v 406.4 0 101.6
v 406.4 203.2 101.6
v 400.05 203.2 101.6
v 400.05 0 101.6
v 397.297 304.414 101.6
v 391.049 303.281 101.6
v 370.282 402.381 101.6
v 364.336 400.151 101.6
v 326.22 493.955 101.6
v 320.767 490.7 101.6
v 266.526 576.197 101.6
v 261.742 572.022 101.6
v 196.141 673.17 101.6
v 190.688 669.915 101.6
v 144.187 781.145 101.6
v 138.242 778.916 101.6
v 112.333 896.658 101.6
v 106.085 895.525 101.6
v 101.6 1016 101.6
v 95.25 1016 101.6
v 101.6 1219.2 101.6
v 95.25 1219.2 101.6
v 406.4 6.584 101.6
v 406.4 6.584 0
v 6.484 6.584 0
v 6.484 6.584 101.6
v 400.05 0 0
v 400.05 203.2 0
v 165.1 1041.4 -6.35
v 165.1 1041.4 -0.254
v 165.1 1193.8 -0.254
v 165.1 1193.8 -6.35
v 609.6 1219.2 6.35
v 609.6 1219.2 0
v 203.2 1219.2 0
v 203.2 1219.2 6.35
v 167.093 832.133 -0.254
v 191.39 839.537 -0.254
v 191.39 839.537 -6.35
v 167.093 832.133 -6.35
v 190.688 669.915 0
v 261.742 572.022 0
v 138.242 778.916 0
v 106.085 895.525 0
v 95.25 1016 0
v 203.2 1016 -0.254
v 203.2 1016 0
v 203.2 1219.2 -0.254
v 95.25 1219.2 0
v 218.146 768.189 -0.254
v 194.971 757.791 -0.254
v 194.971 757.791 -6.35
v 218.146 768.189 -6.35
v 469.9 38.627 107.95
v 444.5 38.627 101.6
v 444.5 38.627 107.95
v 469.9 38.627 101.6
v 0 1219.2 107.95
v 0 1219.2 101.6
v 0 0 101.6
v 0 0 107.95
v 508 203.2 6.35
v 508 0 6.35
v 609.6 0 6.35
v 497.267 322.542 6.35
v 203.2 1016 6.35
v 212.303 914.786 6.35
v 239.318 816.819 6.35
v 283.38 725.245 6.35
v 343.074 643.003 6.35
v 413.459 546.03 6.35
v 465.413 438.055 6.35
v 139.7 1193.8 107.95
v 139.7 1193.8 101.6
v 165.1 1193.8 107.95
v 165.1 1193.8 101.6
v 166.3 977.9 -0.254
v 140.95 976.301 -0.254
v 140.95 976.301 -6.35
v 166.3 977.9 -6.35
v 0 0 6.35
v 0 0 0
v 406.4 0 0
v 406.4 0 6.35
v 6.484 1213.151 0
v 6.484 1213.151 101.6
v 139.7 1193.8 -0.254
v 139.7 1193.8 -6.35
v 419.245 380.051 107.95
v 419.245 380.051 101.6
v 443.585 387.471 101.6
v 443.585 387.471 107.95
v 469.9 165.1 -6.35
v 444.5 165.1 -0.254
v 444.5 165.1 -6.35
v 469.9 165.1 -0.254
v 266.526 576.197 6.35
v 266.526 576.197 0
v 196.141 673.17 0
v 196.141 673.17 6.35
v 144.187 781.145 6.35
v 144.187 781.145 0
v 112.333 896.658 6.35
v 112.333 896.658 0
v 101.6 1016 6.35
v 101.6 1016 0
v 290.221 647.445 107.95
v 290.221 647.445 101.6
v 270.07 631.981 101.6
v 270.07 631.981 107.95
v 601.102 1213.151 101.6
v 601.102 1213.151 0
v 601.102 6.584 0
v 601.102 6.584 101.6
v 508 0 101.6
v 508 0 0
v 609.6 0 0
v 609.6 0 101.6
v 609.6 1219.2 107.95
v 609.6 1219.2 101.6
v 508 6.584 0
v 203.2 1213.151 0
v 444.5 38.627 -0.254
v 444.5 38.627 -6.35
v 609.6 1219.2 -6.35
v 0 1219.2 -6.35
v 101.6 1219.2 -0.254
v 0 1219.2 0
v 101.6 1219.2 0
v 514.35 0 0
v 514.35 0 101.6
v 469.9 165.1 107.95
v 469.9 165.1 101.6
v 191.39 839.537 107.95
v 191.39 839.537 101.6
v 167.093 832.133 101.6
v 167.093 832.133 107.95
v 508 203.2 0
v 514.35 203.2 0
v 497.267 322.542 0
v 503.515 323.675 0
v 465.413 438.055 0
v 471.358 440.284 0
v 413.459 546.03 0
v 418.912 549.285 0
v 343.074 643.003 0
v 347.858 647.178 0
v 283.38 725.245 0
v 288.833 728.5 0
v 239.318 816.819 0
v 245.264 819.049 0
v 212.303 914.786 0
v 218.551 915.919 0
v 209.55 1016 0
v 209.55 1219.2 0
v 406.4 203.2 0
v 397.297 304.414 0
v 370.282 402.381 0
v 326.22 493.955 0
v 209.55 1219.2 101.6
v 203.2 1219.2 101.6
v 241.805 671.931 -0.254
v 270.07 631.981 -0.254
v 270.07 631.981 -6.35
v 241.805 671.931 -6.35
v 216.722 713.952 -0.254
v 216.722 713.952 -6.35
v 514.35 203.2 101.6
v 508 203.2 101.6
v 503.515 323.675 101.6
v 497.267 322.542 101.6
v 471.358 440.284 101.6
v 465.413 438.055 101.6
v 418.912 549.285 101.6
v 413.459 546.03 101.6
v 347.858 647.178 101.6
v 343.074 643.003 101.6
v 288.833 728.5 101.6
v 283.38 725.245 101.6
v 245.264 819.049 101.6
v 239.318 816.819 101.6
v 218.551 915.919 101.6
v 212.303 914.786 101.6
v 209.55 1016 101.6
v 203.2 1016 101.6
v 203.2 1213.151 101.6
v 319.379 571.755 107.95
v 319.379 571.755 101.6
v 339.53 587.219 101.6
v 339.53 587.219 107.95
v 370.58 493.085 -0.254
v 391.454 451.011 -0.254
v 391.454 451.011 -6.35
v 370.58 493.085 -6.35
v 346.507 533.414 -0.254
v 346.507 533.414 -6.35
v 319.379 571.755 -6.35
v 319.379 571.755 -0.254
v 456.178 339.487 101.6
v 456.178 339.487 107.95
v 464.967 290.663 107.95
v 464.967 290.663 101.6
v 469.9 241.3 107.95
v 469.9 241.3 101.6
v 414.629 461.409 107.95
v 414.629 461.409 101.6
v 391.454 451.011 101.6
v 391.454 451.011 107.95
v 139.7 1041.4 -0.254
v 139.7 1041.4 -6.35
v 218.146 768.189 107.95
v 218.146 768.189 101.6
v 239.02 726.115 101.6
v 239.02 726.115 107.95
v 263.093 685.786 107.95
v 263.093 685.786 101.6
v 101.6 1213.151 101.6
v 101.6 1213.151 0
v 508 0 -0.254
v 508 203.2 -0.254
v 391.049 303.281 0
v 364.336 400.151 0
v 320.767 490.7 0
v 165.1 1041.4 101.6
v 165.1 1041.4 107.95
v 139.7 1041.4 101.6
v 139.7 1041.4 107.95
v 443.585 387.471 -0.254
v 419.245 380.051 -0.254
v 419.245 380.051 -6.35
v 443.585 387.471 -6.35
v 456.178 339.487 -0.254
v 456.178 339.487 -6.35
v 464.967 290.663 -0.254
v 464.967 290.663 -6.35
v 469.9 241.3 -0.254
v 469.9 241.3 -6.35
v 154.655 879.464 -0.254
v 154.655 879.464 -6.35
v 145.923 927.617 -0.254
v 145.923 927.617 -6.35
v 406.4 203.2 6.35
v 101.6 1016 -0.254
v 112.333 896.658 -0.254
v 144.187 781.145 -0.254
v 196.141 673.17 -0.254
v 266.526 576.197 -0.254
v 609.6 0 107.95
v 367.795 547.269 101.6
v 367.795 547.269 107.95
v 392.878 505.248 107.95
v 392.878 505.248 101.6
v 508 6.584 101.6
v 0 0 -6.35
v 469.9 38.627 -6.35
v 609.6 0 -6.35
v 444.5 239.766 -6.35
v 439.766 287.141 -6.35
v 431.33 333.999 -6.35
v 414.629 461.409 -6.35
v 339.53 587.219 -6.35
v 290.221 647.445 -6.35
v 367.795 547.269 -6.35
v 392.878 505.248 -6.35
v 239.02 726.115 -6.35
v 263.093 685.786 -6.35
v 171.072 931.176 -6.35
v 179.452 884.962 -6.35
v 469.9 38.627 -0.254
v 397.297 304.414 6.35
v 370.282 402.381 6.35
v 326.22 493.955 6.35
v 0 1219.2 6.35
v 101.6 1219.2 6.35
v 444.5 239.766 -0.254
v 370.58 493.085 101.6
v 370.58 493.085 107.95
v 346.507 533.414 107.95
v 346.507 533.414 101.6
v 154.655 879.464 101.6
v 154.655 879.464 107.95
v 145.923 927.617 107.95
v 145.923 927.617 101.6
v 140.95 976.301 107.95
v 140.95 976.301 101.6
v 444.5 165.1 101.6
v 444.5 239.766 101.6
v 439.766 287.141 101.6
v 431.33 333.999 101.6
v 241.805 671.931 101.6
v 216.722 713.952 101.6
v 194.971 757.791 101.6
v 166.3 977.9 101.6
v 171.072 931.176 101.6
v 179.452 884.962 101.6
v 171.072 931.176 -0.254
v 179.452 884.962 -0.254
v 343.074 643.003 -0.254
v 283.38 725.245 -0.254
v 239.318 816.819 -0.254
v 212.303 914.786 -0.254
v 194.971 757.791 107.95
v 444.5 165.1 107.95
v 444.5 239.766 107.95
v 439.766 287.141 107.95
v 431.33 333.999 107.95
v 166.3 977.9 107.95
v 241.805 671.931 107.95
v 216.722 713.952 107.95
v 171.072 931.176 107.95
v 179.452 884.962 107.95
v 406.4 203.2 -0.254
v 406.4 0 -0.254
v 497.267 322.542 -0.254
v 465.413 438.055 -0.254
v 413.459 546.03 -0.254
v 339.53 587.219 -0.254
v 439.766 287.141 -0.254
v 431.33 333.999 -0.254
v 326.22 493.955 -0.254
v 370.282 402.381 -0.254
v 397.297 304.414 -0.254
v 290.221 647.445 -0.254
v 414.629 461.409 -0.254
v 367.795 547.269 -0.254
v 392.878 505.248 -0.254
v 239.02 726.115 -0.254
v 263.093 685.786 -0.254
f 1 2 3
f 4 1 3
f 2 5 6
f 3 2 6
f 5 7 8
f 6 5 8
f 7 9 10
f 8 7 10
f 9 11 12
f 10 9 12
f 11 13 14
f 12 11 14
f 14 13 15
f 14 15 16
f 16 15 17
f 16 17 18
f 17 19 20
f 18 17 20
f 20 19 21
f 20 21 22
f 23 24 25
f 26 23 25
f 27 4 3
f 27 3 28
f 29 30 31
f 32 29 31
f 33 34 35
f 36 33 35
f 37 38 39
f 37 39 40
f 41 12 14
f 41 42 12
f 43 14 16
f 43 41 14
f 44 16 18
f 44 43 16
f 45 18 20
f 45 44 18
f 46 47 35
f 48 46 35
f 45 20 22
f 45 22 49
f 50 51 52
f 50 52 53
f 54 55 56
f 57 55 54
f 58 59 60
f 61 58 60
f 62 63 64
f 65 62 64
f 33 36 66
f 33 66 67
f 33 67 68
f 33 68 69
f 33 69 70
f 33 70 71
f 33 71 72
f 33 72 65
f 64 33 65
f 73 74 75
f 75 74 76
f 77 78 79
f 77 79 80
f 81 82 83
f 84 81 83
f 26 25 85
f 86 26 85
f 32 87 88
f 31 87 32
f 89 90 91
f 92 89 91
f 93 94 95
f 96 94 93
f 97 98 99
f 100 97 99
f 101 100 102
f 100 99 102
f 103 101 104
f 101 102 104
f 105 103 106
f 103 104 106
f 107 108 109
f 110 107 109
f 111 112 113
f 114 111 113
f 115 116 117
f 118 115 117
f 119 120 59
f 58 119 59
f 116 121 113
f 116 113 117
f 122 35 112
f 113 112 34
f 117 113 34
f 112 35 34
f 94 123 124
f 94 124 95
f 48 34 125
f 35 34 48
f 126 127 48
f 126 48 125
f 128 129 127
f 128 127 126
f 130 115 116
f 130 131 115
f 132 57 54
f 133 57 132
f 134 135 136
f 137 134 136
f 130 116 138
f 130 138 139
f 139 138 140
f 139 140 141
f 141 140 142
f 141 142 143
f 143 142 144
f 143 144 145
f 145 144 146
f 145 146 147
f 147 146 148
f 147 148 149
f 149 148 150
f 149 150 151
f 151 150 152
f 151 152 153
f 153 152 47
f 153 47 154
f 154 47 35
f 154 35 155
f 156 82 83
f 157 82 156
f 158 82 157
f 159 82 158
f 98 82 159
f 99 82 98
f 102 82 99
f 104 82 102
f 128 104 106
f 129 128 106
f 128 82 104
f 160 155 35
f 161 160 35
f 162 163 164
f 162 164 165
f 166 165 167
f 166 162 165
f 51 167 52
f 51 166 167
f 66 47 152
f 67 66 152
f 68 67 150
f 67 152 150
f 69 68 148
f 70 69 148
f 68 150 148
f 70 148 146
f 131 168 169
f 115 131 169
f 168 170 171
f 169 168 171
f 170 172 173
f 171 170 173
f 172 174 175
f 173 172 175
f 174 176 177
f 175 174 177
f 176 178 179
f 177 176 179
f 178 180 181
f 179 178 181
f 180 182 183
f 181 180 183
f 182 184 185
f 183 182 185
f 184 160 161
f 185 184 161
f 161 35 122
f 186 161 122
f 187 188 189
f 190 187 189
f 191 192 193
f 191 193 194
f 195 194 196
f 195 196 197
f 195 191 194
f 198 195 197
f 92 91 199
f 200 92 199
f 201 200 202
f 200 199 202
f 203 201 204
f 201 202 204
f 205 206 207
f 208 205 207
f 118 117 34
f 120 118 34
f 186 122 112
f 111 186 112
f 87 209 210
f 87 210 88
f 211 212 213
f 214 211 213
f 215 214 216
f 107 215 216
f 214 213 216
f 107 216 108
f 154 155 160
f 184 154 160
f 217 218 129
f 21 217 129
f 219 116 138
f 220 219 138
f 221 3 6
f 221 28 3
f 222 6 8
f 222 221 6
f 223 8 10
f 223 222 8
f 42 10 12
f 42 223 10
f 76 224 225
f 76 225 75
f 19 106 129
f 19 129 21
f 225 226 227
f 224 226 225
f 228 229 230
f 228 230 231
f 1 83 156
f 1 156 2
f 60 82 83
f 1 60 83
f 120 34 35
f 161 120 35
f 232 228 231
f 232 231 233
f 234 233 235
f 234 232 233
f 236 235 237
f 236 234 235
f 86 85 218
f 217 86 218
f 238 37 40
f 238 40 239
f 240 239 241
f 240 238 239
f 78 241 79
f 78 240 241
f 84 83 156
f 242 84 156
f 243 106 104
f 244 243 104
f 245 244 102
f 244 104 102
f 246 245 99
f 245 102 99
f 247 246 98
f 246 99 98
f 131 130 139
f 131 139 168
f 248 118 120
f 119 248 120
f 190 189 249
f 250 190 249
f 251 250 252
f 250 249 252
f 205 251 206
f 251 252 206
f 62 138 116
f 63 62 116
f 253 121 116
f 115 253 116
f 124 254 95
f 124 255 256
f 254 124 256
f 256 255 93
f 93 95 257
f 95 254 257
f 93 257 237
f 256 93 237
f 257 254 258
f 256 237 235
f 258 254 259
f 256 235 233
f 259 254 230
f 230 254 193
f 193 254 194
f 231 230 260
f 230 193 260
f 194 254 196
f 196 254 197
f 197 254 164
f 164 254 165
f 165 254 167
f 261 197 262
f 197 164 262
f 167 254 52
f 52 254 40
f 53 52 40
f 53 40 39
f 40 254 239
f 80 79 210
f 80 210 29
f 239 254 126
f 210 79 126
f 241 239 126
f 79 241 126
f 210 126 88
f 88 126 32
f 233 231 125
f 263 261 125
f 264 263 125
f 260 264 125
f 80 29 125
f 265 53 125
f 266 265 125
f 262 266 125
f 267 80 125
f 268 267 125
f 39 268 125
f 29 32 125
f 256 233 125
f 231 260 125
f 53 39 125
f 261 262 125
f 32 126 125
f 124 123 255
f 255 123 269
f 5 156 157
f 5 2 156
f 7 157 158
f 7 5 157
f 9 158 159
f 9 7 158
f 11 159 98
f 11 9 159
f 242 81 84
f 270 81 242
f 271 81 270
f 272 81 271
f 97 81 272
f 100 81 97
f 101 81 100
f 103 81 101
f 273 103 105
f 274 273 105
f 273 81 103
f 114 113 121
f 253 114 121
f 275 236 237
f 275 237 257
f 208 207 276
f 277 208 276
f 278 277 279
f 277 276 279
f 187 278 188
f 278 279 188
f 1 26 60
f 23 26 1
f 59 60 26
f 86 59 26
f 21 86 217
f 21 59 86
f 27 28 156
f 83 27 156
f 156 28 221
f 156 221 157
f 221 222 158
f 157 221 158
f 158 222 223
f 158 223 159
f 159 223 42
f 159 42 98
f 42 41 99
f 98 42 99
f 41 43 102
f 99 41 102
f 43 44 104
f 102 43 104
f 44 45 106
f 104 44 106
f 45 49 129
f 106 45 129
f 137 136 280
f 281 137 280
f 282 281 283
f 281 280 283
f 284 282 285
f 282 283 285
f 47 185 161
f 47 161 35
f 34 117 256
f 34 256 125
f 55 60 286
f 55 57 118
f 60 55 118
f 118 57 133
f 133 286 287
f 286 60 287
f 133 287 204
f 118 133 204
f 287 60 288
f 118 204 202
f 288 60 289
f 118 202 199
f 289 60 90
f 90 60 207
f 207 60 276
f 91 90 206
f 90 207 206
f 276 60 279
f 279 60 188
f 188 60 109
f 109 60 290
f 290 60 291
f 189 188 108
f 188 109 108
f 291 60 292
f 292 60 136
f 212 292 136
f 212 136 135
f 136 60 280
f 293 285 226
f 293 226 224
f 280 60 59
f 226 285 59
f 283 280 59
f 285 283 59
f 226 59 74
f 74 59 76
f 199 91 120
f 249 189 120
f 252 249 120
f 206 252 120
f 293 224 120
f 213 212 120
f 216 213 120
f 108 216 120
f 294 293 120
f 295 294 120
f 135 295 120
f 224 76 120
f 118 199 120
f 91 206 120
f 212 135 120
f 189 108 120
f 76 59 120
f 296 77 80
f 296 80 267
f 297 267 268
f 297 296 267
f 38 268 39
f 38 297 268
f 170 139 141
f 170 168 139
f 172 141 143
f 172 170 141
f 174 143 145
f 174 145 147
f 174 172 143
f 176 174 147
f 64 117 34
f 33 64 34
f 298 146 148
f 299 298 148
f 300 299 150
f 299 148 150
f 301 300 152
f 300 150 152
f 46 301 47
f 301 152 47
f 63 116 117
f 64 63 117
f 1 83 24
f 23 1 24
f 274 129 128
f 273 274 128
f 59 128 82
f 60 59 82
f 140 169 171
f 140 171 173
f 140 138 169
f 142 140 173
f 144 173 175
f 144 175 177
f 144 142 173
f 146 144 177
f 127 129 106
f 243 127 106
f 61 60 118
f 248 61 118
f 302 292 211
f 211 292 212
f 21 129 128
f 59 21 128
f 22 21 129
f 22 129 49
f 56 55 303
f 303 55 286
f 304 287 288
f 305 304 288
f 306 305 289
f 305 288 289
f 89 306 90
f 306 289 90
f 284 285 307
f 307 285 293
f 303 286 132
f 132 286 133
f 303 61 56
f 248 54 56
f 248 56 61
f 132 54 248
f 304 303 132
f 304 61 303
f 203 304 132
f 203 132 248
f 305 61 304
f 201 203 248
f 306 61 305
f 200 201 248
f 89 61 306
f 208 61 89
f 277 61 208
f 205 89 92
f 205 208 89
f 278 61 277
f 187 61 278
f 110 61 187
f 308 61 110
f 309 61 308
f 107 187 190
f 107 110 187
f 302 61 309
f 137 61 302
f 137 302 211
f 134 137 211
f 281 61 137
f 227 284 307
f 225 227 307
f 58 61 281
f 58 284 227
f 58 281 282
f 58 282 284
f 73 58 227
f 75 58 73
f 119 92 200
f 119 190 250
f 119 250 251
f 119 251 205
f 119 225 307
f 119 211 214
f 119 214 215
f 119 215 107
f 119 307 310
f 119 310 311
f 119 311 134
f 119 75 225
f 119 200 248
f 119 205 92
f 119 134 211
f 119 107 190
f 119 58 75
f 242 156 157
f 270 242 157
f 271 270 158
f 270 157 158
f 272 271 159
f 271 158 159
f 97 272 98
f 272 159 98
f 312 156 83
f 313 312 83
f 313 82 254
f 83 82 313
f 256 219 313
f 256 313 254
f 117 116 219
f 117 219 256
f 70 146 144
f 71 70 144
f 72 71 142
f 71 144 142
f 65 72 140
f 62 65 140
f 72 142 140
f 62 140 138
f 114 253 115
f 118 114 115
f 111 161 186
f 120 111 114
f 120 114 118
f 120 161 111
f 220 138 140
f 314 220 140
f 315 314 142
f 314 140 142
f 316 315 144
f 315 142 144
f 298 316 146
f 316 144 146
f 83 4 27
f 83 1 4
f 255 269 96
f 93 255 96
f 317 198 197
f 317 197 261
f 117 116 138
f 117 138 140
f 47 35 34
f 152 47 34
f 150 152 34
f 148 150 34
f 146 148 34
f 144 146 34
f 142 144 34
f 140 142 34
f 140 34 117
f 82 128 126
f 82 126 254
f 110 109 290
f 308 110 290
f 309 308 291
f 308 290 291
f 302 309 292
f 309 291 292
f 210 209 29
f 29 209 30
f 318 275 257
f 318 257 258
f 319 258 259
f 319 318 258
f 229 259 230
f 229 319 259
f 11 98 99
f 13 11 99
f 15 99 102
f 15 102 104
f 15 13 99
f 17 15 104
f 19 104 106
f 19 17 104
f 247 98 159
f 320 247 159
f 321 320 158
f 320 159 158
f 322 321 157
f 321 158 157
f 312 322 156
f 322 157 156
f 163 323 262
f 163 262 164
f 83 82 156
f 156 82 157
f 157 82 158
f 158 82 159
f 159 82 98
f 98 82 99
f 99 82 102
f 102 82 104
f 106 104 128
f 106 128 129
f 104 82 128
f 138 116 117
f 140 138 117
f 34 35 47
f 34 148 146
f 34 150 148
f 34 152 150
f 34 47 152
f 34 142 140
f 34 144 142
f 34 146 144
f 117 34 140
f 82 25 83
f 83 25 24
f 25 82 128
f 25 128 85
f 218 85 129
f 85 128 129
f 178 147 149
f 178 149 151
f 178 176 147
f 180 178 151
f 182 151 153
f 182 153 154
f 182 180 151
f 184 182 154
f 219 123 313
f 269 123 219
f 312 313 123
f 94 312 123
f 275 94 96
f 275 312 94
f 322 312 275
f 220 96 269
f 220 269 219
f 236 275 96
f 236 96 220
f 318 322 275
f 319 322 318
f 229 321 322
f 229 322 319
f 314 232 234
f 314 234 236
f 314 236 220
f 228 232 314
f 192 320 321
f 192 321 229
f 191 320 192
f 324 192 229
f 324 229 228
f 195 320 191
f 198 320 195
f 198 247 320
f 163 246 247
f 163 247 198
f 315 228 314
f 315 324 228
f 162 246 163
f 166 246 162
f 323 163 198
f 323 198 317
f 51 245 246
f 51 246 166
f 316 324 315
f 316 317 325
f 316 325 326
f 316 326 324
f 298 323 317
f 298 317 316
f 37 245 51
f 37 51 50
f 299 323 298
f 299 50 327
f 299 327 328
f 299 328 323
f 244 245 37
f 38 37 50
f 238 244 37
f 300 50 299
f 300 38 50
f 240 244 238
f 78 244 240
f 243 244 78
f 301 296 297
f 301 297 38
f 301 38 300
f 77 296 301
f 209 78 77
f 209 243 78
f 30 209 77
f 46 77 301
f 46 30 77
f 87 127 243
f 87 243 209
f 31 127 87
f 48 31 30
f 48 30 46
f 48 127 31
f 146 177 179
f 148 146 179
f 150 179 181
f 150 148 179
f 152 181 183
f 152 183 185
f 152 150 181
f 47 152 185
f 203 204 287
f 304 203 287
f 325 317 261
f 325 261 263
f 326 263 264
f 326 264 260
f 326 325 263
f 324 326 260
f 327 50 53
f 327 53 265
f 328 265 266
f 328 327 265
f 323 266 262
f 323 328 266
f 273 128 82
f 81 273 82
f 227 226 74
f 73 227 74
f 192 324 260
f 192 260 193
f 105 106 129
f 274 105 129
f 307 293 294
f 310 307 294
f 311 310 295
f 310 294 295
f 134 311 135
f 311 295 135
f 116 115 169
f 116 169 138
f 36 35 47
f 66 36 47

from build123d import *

# Parameters (mm, degrees)
F0_W      = 25.4
F0_H      = 126.473148486
F0_H_2    = 152.4
F1_DEPTH  = 6.35
F2_W      = 6.35
F2_H      = 101.6
F2_W_2    = 101.6
F2_R      = 44.45
F5_DEPTH  = 6.35
F6_DEPTH  = 6.35
F7_DEPTH  = 0.254
F9_DEPTH  = 101.6
F11_START = 101.6
F11_DEPTH = 6.35


with BuildPart() as f1:
    # F0 (on Top) → F1 (new body)
    with BuildSketch(Plane.XY):
        with BuildLine():
            Line((0, 1219.2), (0, 0))
            Line((0, 0), (406.4, 0))
            Line((406.4, 0), (406.4, 203.2))
            ThreePointArc((406.4, 203.2), (370.2816647957, 402.3806242984), (266.5260273973, 576.197260274))
            ThreePointArc((266.5260273973, 576.197260274), (144.1872907633, 781.1452340362), (101.6, 1016))
            Line((101.6, 1016), (101.6, 1219.2))
            Line((101.6, 1219.2), (0, 1219.2))
        make_face()
        with BuildLine():
            Line((406.4, 203.2), (406.4, 0))
            Line((406.4, 0), (508, 0))
            Line((508, 0), (508, 203.2))
            ThreePointArc((508, 203.2), (465.4127092367, 438.0547659638), (343.0739726027, 643.002739726))
            ThreePointArc((343.0739726027, 643.002739726), (239.3183352043, 816.8193757016), (203.2, 1016))
            Line((203.2, 1016), (203.2, 1219.2))
            Line((203.2, 1219.2), (101.6, 1219.2))
            Line((101.6, 1219.2), (101.6, 1016))
            ThreePointArc((101.6, 1016), (144.1872907633, 781.1452340362), (266.5260273973, 576.197260274))
            ThreePointArc((266.5260273973, 576.197260274), (370.2816647957, 402.3806242984), (406.4, 203.2))
        make_face()
        with Locations((457.2, 101.863425757)):
            Rectangle(F0_W, F0_H, mode=Mode.SUBTRACT)
        with BuildLine():
            Line((469.9, 241.3), (444.5, 239.7657718121))
            ThreePointArc((444.5, 239.7657718121), (436.0082925939, 310.6529654643), (419.2450112594, 380.0510613852))
            Line((419.2450112594, 380.0510613852), (443.5853613822, 387.4713856391))
            ThreePointArc((443.5853613822, 387.4713856391), (461.0519971782, 315.1614814977), (469.9, 241.3))
        make_face(mode=Mode.SUBTRACT)
        with BuildLine():
            Line((319.3793460557, 571.7547020123), (339.5295284077, 587.2185356631))
            ThreePointArc((339.5295284077, 587.2185356631), (380.7444662625, 526.5016678969), (414.6285819031, 461.4088430929))
            Line((414.6285819031, 461.4088430929), (391.4542765916, 451.0111715589))
            ThreePointArc((391.4542765916, 451.0111715589), (358.9346219835, 513.482808787), (319.3793460557, 571.7547020123))
        make_face(mode=Mode.SUBTRACT)
        with BuildLine():
            ThreePointArc((218.1457234084, 768.1888284411), (250.6653780165, 705.717191213), (290.2206539443, 647.4452979877))
            Line((290.2206539443, 647.4452979877), (270.0704715923, 631.9814643369))
            ThreePointArc((270.0704715923, 631.9814643369), (228.8555337375, 692.6983321031), (194.9714180969, 757.7911569071))
            Line((194.9714180969, 757.7911569071), (218.1457234084, 768.1888284411))
        make_face(mode=Mode.SUBTRACT)
        with BuildLine():
            ThreePointArc((166.3001406897, 977.9), (174.8139858785, 907.9875702476), (191.3901171594, 839.5371117718))
            Line((191.3901171594, 839.5371117718), (167.0931989982, 832.1330745035))
            ThreePointArc((167.0931989982, 832.1330745035), (149.8215657056, 903.4555801881), (140.9504962431, 976.3013986014))
            Line((140.9504962431, 976.3013986014), (166.3001406897, 977.9))
        make_face(mode=Mode.SUBTRACT)
        with Locations((152.4, 1117.6)):
            Rectangle(F0_W, F0_H_2, mode=Mode.SUBTRACT)
        with BuildLine():
            Line((508, 203.2), (508, 0))
            Line((508, 0), (609.6, 0))
            Line((609.6, 0), (609.6, 1219.2))
            Line((609.6, 1219.2), (203.2, 1219.2))
            Line((203.2, 1219.2), (203.2, 1016))
            ThreePointArc((203.2, 1016), (239.3183352043, 816.8193757016), (343.0739726027, 643.002739726))
            ThreePointArc((343.0739726027, 643.002739726), (465.4127092367, 438.0547659638), (508, 203.2))
        make_face()
    extrude(amount=-F1_DEPTH)

    # F0 (on Top) → F7 (cut)
    with BuildSketch(Plane.XY):
        with BuildLine():
            Line((406.4, 203.2), (406.4, 0))
            Line((406.4, 0), (508, 0))
            Line((508, 0), (508, 203.2))
            ThreePointArc((508, 203.2), (465.4127092367, 438.0547659638), (343.0739726027, 643.002739726))
            ThreePointArc((343.0739726027, 643.002739726), (239.3183352043, 816.8193757016), (203.2, 1016))
            Line((203.2, 1016), (203.2, 1219.2))
            Line((203.2, 1219.2), (101.6, 1219.2))
            Line((101.6, 1219.2), (101.6, 1016))
            ThreePointArc((101.6, 1016), (144.1872907633, 781.1452340362), (266.5260273973, 576.197260274))
            ThreePointArc((266.5260273973, 576.197260274), (370.2816647957, 402.3806242984), (406.4, 203.2))
        make_face()
        with Locations((457.2, 101.863425757)):
            Rectangle(F0_W, F0_H, mode=Mode.SUBTRACT)
        with BuildLine():
            Line((469.9, 241.3), (444.5, 239.7657718121))
            ThreePointArc((444.5, 239.7657718121), (436.0082925939, 310.6529654643), (419.2450112594, 380.0510613852))
            Line((419.2450112594, 380.0510613852), (443.5853613822, 387.4713856391))
            ThreePointArc((443.5853613822, 387.4713856391), (461.0519971782, 315.1614814977), (469.9, 241.3))
        make_face(mode=Mode.SUBTRACT)
        with BuildLine():
            Line((319.3793460557, 571.7547020123), (339.5295284077, 587.2185356631))
            ThreePointArc((339.5295284077, 587.2185356631), (380.7444662625, 526.5016678969), (414.6285819031, 461.4088430929))
            Line((414.6285819031, 461.4088430929), (391.4542765916, 451.0111715589))
            ThreePointArc((391.4542765916, 451.0111715589), (358.9346219835, 513.482808787), (319.3793460557, 571.7547020123))
        make_face(mode=Mode.SUBTRACT)
        with BuildLine():
            ThreePointArc((218.1457234084, 768.1888284411), (250.6653780165, 705.717191213), (290.2206539443, 647.4452979877))
            Line((290.2206539443, 647.4452979877), (270.0704715923, 631.9814643369))
            ThreePointArc((270.0704715923, 631.9814643369), (228.8555337375, 692.6983321031), (194.9714180969, 757.7911569071))
            Line((194.9714180969, 757.7911569071), (218.1457234084, 768.1888284411))
        make_face(mode=Mode.SUBTRACT)
        with BuildLine():
            ThreePointArc((166.3001406897, 977.9), (174.8139858785, 907.9875702476), (191.3901171594, 839.5371117718))
            Line((191.3901171594, 839.5371117718), (167.0931989982, 832.1330745035))
            ThreePointArc((167.0931989982, 832.1330745035), (149.8215657056, 903.4555801881), (140.9504962431, 976.3013986014))
            Line((140.9504962431, 976.3013986014), (166.3001406897, 977.9))
        make_face(mode=Mode.SUBTRACT)
        with Locations((152.4, 1117.6)):
            Rectangle(F0_W, F0_H_2, mode=Mode.SUBTRACT)
    extrude(amount=-F7_DEPTH, mode=Mode.SUBTRACT)


with BuildPart() as f3:
    # F3: sweep along a path in F0
    with BuildLine(Plane.XY) as f3_path:
        Line((406.4, 0), (406.4, 203.2))
        ThreePointArc((406.4, 203.2), (370.2816647957, 402.3806242984), (266.5260273973, 576.197260274))
        ThreePointArc((266.5260273973, 576.197260274), (144.1872907633, 781.1452340362), (101.6, 1016))
        Line((101.6, 1016), (101.6, 1219.2))
    # F2 (on face) → F3 (sweep)
    with BuildSketch(Plane.XZ):
        with Locations((403.225, 50.8)):
            Rectangle(F2_W, F2_H)
    sweep(path=f3_path.line)


with BuildPart() as f4:
    # F4: sweep along a path in F0
    with BuildLine(Plane.XY) as f4_path:
        Line((508, 0), (508, 203.2))
        ThreePointArc((508, 203.2), (465.4127092367, 438.0547659638), (343.0739726027, 643.002739726))
        ThreePointArc((343.0739726027, 643.002739726), (239.3183352043, 816.8193757016), (203.2, 1016))
        Line((203.2, 1016), (203.2, 1219.2))
    # F2 (on face) → F4 (sweep)
    with BuildSketch(Plane.XZ):
        with Locations((511.175, 50.8)):
            Rectangle(F2_W, F2_H)
    sweep(path=f4_path.line)


with BuildPart() as f5:
    # F2 (on face) → F5 (new body)
    with BuildSketch(Plane.XZ):
        with Locations((457.2, 50.8)):
            Rectangle(F2_W_2, F2_H)
        with Locations((457.2, 50.8)):
            Circle(F2_R, mode=Mode.SUBTRACT)
    extrude(amount=F5_DEPTH)


with BuildPart() as f6:
    # F0 (on Top) → F6 (new body)
    with BuildSketch(Plane.XY):
        with BuildLine():
            Line((0, 1219.2), (0, 0))
            Line((0, 0), (406.4, 0))
            Line((406.4, 0), (406.4, 203.2))
            ThreePointArc((406.4, 203.2), (370.2816647957, 402.3806242984), (266.5260273973, 576.197260274))
            ThreePointArc((266.5260273973, 576.197260274), (144.1872907633, 781.1452340362), (101.6, 1016))
            Line((101.6, 1016), (101.6, 1219.2))
            Line((101.6, 1219.2), (0, 1219.2))
        make_face()
    extrude(amount=F6_DEPTH)


with BuildPart() as f6b:
    # F0 (on Top) → F6, piece 2 (new body)
    with BuildSketch(Plane.XY):
        with BuildLine():
            Line((508, 203.2), (508, 0))
            Line((508, 0), (609.6, 0))
            Line((609.6, 0), (609.6, 1219.2))
            Line((609.6, 1219.2), (203.2, 1219.2))
            Line((203.2, 1219.2), (203.2, 1016))
            ThreePointArc((203.2, 1016), (239.3183352043, 816.8193757016), (343.0739726027, 643.002739726))
            ThreePointArc((343.0739726027, 643.002739726), (465.4127092367, 438.0547659638), (508, 203.2))
        make_face()
    extrude(amount=F6_DEPTH)


with BuildPart() as f9:
    # F8 (on face) → F9 (new body)
    with BuildSketch(Plane.XY):
        Polygon((101.6, 1219.2), (0, 1219.2), (0, 0), (406.4, 0), (406.4, 6.5835835412), (6.4838468097, 6.5835835412), (6.4838468097, 1213.1507396698), (101.6, 1213.1507396698), align=None)
    extrude(amount=F9_DEPTH)


with BuildPart() as f9b:
    # F8 (on face) → F9, piece 2 (new body)
    with BuildSketch(Plane.XY):
        Polygon((508, 6.5835835412), (508, 0), (609.6, 0), (609.6, 1219.2), (203.2, 1219.2), (203.2, 1213.1507396698), (601.1018157005, 1213.1507396698), (601.1018157005, 6.5835835412), align=None)
    extrude(amount=F9_DEPTH)


with BuildPart() as f11:
    # F0 (on Top) → F11 (new body)
    with BuildSketch(Plane.XY.offset(F11_START)):
        with BuildLine():
            Line((0, 1219.2), (0, 0))
            Line((0, 0), (406.4, 0))
            Line((406.4, 0), (406.4, 203.2))
            ThreePointArc((406.4, 203.2), (370.2816647957, 402.3806242984), (266.5260273973, 576.197260274))
            ThreePointArc((266.5260273973, 576.197260274), (144.1872907633, 781.1452340362), (101.6, 1016))
            Line((101.6, 1016), (101.6, 1219.2))
            Line((101.6, 1219.2), (0, 1219.2))
        make_face()
        with BuildLine():
            Line((406.4, 203.2), (406.4, 0))
            Line((406.4, 0), (508, 0))
            Line((508, 0), (508, 203.2))
            ThreePointArc((508, 203.2), (465.4127092367, 438.0547659638), (343.0739726027, 643.002739726))
            ThreePointArc((343.0739726027, 643.002739726), (239.3183352043, 816.8193757016), (203.2, 1016))
            Line((203.2, 1016), (203.2, 1219.2))
            Line((203.2, 1219.2), (101.6, 1219.2))
            Line((101.6, 1219.2), (101.6, 1016))
            ThreePointArc((101.6, 1016), (144.1872907633, 781.1452340362), (266.5260273973, 576.197260274))
            ThreePointArc((266.5260273973, 576.197260274), (370.2816647957, 402.3806242984), (406.4, 203.2))
        make_face()
        with Locations((457.2, 101.863425757)):
            Rectangle(F0_W, F0_H, mode=Mode.SUBTRACT)
        with BuildLine():
            Line((469.9, 241.3), (444.5, 239.7657718121))
            ThreePointArc((444.5, 239.7657718121), (436.0082925939, 310.6529654643), (419.2450112594, 380.0510613852))
            Line((419.2450112594, 380.0510613852), (443.5853613822, 387.4713856391))
            ThreePointArc((443.5853613822, 387.4713856391), (461.0519971782, 315.1614814977), (469.9, 241.3))
        make_face(mode=Mode.SUBTRACT)
        with BuildLine():
            Line((319.3793460557, 571.7547020123), (339.5295284077, 587.2185356631))
            ThreePointArc((339.5295284077, 587.2185356631), (380.7444662625, 526.5016678969), (414.6285819031, 461.4088430929))
            Line((414.6285819031, 461.4088430929), (391.4542765916, 451.0111715589))
            ThreePointArc((391.4542765916, 451.0111715589), (358.9346219835, 513.482808787), (319.3793460557, 571.7547020123))
        make_face(mode=Mode.SUBTRACT)
        with BuildLine():
            ThreePointArc((218.1457234084, 768.1888284411), (250.6653780165, 705.717191213), (290.2206539443, 647.4452979877))
            Line((290.2206539443, 647.4452979877), (270.0704715923, 631.9814643369))
            ThreePointArc((270.0704715923, 631.9814643369), (228.8555337375, 692.6983321031), (194.9714180969, 757.7911569071))
            Line((194.9714180969, 757.7911569071), (218.1457234084, 768.1888284411))
        make_face(mode=Mode.SUBTRACT)
        with BuildLine():
            ThreePointArc((166.3001406897, 977.9), (174.8139858785, 907.9875702476), (191.3901171594, 839.5371117718))
            Line((191.3901171594, 839.5371117718), (167.0931989982, 832.1330745035))
            ThreePointArc((167.0931989982, 832.1330745035), (149.8215657056, 903.4555801881), (140.9504962431, 976.3013986014))
            Line((140.9504962431, 976.3013986014), (166.3001406897, 977.9))
        make_face(mode=Mode.SUBTRACT)
        with Locations((152.4, 1117.6)):
            Rectangle(F0_W, F0_H_2, mode=Mode.SUBTRACT)
        with BuildLine():
            Line((508, 203.2), (508, 0))
            Line((508, 0), (609.6, 0))
            Line((609.6, 0), (609.6, 1219.2))
            Line((609.6, 1219.2), (203.2, 1219.2))
            Line((203.2, 1219.2), (203.2, 1016))
            ThreePointArc((203.2, 1016), (239.3183352043, 816.8193757016), (343.0739726027, 643.002739726))
            ThreePointArc((343.0739726027, 643.002739726), (465.4127092367, 438.0547659638), (508, 203.2))
        make_face()
    extrude(amount=F11_DEPTH)


solid = Compound([f1.part, f3.part, f4.part, f6.part, f6b.part, f9.part, f9b.part, f11.part])
